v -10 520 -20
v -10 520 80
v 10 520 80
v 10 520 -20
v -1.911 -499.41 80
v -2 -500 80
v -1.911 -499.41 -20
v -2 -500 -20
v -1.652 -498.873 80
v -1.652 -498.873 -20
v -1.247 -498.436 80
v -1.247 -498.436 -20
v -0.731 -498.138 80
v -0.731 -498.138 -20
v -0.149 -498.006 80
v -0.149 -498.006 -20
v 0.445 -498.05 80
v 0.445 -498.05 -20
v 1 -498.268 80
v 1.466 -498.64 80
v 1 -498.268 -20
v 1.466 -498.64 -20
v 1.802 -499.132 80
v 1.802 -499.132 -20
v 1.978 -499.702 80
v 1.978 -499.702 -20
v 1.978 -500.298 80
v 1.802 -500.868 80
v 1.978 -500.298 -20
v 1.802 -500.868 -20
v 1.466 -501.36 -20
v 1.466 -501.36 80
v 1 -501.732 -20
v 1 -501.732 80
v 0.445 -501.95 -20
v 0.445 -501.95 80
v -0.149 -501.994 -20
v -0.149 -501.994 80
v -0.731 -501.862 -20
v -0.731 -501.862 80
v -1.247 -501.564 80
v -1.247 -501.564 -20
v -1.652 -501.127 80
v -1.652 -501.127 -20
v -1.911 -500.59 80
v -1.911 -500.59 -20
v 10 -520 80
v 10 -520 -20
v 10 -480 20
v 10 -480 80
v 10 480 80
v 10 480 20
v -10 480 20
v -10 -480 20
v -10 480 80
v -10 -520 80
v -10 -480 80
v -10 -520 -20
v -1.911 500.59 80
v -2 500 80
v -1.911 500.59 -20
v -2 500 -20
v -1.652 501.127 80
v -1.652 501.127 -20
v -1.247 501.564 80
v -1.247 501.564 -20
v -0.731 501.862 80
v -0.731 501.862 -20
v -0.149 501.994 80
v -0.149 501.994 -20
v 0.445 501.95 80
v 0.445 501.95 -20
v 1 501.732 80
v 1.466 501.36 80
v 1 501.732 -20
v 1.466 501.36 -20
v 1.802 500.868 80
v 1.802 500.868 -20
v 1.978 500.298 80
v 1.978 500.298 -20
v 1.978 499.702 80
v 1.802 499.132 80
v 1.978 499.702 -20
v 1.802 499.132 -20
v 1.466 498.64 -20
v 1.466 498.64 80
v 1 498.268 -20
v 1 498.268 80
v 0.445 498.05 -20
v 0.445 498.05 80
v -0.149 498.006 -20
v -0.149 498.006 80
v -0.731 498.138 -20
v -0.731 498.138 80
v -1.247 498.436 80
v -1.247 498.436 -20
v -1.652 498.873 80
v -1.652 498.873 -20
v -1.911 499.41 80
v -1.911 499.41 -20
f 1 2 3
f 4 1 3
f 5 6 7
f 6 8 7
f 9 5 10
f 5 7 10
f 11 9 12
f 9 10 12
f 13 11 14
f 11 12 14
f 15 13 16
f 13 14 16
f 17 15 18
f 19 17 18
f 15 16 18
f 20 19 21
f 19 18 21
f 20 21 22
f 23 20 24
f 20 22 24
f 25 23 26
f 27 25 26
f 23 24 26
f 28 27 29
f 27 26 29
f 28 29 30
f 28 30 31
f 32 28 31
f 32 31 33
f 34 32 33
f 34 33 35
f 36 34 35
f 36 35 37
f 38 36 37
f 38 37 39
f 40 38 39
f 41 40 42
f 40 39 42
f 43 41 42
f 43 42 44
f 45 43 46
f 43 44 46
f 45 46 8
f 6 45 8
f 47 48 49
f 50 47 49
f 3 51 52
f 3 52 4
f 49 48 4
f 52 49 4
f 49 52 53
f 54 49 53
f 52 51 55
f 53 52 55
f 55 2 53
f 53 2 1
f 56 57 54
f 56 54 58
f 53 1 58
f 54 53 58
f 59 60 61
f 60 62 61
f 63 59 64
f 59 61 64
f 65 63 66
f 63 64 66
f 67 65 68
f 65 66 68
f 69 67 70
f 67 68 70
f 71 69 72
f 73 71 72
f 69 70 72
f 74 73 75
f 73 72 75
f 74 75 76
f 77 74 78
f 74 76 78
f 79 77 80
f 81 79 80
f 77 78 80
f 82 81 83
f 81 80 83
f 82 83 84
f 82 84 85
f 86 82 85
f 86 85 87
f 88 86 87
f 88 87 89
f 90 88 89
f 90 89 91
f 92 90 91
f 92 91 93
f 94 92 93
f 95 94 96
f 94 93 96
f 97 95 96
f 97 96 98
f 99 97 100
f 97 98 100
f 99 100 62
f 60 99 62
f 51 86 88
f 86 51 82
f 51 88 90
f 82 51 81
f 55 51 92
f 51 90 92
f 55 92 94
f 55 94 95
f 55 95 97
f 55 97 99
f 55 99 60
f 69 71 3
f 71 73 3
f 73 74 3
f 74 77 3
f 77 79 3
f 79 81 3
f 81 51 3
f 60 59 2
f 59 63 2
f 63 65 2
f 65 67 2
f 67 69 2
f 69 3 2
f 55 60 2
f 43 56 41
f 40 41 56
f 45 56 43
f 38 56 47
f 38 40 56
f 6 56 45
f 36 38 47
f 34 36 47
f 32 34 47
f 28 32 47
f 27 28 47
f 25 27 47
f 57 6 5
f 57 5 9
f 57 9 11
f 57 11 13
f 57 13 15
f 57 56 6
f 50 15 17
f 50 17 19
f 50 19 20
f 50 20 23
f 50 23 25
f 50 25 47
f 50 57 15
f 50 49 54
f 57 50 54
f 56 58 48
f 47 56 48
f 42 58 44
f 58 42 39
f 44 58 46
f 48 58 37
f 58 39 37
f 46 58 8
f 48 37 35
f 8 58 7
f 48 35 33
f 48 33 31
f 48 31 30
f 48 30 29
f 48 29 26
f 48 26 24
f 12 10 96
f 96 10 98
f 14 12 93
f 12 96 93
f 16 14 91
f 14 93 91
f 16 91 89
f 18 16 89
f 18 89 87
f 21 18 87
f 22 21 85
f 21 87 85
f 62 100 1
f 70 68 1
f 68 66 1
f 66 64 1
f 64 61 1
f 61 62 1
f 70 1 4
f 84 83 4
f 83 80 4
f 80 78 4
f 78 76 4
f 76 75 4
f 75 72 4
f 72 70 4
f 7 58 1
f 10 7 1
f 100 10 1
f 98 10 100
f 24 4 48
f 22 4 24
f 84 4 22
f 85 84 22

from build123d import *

# Parameters (mm, degrees)
F2_W           = 20
F2_H           = 40
F6_D           = 4
F6_DEPTH       = 100
F6_TIP         = 1.2017212381
F6_ON_F5_D     = 4
F6_ON_F5_DEPTH = 100
F6_ON_F5_TIP   = 1.2017212381


with BuildPart() as f3:
    # F3: sweep along a path in F0
    with BuildLine(Plane.YZ) as f3_path:
        Line((-500, 80), (-500, 0))
        Line((-500, 0), (500, 0))
        Line((500, 0), (500, 80))
    # F2 (on plane+point) → F3 (sweep)
    with BuildSketch(Plane.XY.offset(80)):
        with Locations((0, -500)):
            Rectangle(F2_W, F2_H)
    sweep(path=f3_path.line, transition=Transition.RIGHT)

    # F6
    with Locations(Plane.XY.offset(80)):
        with Locations((0, -500)):
            Hole(F6_D / 2, depth=F6_DEPTH)
            with Locations((0, 0, -(F6_DEPTH + F6_TIP / 2))):  # 118° drill point
                Cone(0, F6_D / 2, F6_TIP, mode=Mode.SUBTRACT)

    # F6 on F5
    with Locations(Plane.XY.offset(80)):
        with Locations((0, 500)):
            Hole(F6_ON_F5_D / 2, depth=F6_ON_F5_DEPTH)
            with Locations((0, 0, -(F6_ON_F5_DEPTH + F6_ON_F5_TIP / 2))):  # 118° drill point
                Cone(0, F6_ON_F5_D / 2, F6_ON_F5_TIP, mode=Mode.SUBTRACT)


solid = f3.part
